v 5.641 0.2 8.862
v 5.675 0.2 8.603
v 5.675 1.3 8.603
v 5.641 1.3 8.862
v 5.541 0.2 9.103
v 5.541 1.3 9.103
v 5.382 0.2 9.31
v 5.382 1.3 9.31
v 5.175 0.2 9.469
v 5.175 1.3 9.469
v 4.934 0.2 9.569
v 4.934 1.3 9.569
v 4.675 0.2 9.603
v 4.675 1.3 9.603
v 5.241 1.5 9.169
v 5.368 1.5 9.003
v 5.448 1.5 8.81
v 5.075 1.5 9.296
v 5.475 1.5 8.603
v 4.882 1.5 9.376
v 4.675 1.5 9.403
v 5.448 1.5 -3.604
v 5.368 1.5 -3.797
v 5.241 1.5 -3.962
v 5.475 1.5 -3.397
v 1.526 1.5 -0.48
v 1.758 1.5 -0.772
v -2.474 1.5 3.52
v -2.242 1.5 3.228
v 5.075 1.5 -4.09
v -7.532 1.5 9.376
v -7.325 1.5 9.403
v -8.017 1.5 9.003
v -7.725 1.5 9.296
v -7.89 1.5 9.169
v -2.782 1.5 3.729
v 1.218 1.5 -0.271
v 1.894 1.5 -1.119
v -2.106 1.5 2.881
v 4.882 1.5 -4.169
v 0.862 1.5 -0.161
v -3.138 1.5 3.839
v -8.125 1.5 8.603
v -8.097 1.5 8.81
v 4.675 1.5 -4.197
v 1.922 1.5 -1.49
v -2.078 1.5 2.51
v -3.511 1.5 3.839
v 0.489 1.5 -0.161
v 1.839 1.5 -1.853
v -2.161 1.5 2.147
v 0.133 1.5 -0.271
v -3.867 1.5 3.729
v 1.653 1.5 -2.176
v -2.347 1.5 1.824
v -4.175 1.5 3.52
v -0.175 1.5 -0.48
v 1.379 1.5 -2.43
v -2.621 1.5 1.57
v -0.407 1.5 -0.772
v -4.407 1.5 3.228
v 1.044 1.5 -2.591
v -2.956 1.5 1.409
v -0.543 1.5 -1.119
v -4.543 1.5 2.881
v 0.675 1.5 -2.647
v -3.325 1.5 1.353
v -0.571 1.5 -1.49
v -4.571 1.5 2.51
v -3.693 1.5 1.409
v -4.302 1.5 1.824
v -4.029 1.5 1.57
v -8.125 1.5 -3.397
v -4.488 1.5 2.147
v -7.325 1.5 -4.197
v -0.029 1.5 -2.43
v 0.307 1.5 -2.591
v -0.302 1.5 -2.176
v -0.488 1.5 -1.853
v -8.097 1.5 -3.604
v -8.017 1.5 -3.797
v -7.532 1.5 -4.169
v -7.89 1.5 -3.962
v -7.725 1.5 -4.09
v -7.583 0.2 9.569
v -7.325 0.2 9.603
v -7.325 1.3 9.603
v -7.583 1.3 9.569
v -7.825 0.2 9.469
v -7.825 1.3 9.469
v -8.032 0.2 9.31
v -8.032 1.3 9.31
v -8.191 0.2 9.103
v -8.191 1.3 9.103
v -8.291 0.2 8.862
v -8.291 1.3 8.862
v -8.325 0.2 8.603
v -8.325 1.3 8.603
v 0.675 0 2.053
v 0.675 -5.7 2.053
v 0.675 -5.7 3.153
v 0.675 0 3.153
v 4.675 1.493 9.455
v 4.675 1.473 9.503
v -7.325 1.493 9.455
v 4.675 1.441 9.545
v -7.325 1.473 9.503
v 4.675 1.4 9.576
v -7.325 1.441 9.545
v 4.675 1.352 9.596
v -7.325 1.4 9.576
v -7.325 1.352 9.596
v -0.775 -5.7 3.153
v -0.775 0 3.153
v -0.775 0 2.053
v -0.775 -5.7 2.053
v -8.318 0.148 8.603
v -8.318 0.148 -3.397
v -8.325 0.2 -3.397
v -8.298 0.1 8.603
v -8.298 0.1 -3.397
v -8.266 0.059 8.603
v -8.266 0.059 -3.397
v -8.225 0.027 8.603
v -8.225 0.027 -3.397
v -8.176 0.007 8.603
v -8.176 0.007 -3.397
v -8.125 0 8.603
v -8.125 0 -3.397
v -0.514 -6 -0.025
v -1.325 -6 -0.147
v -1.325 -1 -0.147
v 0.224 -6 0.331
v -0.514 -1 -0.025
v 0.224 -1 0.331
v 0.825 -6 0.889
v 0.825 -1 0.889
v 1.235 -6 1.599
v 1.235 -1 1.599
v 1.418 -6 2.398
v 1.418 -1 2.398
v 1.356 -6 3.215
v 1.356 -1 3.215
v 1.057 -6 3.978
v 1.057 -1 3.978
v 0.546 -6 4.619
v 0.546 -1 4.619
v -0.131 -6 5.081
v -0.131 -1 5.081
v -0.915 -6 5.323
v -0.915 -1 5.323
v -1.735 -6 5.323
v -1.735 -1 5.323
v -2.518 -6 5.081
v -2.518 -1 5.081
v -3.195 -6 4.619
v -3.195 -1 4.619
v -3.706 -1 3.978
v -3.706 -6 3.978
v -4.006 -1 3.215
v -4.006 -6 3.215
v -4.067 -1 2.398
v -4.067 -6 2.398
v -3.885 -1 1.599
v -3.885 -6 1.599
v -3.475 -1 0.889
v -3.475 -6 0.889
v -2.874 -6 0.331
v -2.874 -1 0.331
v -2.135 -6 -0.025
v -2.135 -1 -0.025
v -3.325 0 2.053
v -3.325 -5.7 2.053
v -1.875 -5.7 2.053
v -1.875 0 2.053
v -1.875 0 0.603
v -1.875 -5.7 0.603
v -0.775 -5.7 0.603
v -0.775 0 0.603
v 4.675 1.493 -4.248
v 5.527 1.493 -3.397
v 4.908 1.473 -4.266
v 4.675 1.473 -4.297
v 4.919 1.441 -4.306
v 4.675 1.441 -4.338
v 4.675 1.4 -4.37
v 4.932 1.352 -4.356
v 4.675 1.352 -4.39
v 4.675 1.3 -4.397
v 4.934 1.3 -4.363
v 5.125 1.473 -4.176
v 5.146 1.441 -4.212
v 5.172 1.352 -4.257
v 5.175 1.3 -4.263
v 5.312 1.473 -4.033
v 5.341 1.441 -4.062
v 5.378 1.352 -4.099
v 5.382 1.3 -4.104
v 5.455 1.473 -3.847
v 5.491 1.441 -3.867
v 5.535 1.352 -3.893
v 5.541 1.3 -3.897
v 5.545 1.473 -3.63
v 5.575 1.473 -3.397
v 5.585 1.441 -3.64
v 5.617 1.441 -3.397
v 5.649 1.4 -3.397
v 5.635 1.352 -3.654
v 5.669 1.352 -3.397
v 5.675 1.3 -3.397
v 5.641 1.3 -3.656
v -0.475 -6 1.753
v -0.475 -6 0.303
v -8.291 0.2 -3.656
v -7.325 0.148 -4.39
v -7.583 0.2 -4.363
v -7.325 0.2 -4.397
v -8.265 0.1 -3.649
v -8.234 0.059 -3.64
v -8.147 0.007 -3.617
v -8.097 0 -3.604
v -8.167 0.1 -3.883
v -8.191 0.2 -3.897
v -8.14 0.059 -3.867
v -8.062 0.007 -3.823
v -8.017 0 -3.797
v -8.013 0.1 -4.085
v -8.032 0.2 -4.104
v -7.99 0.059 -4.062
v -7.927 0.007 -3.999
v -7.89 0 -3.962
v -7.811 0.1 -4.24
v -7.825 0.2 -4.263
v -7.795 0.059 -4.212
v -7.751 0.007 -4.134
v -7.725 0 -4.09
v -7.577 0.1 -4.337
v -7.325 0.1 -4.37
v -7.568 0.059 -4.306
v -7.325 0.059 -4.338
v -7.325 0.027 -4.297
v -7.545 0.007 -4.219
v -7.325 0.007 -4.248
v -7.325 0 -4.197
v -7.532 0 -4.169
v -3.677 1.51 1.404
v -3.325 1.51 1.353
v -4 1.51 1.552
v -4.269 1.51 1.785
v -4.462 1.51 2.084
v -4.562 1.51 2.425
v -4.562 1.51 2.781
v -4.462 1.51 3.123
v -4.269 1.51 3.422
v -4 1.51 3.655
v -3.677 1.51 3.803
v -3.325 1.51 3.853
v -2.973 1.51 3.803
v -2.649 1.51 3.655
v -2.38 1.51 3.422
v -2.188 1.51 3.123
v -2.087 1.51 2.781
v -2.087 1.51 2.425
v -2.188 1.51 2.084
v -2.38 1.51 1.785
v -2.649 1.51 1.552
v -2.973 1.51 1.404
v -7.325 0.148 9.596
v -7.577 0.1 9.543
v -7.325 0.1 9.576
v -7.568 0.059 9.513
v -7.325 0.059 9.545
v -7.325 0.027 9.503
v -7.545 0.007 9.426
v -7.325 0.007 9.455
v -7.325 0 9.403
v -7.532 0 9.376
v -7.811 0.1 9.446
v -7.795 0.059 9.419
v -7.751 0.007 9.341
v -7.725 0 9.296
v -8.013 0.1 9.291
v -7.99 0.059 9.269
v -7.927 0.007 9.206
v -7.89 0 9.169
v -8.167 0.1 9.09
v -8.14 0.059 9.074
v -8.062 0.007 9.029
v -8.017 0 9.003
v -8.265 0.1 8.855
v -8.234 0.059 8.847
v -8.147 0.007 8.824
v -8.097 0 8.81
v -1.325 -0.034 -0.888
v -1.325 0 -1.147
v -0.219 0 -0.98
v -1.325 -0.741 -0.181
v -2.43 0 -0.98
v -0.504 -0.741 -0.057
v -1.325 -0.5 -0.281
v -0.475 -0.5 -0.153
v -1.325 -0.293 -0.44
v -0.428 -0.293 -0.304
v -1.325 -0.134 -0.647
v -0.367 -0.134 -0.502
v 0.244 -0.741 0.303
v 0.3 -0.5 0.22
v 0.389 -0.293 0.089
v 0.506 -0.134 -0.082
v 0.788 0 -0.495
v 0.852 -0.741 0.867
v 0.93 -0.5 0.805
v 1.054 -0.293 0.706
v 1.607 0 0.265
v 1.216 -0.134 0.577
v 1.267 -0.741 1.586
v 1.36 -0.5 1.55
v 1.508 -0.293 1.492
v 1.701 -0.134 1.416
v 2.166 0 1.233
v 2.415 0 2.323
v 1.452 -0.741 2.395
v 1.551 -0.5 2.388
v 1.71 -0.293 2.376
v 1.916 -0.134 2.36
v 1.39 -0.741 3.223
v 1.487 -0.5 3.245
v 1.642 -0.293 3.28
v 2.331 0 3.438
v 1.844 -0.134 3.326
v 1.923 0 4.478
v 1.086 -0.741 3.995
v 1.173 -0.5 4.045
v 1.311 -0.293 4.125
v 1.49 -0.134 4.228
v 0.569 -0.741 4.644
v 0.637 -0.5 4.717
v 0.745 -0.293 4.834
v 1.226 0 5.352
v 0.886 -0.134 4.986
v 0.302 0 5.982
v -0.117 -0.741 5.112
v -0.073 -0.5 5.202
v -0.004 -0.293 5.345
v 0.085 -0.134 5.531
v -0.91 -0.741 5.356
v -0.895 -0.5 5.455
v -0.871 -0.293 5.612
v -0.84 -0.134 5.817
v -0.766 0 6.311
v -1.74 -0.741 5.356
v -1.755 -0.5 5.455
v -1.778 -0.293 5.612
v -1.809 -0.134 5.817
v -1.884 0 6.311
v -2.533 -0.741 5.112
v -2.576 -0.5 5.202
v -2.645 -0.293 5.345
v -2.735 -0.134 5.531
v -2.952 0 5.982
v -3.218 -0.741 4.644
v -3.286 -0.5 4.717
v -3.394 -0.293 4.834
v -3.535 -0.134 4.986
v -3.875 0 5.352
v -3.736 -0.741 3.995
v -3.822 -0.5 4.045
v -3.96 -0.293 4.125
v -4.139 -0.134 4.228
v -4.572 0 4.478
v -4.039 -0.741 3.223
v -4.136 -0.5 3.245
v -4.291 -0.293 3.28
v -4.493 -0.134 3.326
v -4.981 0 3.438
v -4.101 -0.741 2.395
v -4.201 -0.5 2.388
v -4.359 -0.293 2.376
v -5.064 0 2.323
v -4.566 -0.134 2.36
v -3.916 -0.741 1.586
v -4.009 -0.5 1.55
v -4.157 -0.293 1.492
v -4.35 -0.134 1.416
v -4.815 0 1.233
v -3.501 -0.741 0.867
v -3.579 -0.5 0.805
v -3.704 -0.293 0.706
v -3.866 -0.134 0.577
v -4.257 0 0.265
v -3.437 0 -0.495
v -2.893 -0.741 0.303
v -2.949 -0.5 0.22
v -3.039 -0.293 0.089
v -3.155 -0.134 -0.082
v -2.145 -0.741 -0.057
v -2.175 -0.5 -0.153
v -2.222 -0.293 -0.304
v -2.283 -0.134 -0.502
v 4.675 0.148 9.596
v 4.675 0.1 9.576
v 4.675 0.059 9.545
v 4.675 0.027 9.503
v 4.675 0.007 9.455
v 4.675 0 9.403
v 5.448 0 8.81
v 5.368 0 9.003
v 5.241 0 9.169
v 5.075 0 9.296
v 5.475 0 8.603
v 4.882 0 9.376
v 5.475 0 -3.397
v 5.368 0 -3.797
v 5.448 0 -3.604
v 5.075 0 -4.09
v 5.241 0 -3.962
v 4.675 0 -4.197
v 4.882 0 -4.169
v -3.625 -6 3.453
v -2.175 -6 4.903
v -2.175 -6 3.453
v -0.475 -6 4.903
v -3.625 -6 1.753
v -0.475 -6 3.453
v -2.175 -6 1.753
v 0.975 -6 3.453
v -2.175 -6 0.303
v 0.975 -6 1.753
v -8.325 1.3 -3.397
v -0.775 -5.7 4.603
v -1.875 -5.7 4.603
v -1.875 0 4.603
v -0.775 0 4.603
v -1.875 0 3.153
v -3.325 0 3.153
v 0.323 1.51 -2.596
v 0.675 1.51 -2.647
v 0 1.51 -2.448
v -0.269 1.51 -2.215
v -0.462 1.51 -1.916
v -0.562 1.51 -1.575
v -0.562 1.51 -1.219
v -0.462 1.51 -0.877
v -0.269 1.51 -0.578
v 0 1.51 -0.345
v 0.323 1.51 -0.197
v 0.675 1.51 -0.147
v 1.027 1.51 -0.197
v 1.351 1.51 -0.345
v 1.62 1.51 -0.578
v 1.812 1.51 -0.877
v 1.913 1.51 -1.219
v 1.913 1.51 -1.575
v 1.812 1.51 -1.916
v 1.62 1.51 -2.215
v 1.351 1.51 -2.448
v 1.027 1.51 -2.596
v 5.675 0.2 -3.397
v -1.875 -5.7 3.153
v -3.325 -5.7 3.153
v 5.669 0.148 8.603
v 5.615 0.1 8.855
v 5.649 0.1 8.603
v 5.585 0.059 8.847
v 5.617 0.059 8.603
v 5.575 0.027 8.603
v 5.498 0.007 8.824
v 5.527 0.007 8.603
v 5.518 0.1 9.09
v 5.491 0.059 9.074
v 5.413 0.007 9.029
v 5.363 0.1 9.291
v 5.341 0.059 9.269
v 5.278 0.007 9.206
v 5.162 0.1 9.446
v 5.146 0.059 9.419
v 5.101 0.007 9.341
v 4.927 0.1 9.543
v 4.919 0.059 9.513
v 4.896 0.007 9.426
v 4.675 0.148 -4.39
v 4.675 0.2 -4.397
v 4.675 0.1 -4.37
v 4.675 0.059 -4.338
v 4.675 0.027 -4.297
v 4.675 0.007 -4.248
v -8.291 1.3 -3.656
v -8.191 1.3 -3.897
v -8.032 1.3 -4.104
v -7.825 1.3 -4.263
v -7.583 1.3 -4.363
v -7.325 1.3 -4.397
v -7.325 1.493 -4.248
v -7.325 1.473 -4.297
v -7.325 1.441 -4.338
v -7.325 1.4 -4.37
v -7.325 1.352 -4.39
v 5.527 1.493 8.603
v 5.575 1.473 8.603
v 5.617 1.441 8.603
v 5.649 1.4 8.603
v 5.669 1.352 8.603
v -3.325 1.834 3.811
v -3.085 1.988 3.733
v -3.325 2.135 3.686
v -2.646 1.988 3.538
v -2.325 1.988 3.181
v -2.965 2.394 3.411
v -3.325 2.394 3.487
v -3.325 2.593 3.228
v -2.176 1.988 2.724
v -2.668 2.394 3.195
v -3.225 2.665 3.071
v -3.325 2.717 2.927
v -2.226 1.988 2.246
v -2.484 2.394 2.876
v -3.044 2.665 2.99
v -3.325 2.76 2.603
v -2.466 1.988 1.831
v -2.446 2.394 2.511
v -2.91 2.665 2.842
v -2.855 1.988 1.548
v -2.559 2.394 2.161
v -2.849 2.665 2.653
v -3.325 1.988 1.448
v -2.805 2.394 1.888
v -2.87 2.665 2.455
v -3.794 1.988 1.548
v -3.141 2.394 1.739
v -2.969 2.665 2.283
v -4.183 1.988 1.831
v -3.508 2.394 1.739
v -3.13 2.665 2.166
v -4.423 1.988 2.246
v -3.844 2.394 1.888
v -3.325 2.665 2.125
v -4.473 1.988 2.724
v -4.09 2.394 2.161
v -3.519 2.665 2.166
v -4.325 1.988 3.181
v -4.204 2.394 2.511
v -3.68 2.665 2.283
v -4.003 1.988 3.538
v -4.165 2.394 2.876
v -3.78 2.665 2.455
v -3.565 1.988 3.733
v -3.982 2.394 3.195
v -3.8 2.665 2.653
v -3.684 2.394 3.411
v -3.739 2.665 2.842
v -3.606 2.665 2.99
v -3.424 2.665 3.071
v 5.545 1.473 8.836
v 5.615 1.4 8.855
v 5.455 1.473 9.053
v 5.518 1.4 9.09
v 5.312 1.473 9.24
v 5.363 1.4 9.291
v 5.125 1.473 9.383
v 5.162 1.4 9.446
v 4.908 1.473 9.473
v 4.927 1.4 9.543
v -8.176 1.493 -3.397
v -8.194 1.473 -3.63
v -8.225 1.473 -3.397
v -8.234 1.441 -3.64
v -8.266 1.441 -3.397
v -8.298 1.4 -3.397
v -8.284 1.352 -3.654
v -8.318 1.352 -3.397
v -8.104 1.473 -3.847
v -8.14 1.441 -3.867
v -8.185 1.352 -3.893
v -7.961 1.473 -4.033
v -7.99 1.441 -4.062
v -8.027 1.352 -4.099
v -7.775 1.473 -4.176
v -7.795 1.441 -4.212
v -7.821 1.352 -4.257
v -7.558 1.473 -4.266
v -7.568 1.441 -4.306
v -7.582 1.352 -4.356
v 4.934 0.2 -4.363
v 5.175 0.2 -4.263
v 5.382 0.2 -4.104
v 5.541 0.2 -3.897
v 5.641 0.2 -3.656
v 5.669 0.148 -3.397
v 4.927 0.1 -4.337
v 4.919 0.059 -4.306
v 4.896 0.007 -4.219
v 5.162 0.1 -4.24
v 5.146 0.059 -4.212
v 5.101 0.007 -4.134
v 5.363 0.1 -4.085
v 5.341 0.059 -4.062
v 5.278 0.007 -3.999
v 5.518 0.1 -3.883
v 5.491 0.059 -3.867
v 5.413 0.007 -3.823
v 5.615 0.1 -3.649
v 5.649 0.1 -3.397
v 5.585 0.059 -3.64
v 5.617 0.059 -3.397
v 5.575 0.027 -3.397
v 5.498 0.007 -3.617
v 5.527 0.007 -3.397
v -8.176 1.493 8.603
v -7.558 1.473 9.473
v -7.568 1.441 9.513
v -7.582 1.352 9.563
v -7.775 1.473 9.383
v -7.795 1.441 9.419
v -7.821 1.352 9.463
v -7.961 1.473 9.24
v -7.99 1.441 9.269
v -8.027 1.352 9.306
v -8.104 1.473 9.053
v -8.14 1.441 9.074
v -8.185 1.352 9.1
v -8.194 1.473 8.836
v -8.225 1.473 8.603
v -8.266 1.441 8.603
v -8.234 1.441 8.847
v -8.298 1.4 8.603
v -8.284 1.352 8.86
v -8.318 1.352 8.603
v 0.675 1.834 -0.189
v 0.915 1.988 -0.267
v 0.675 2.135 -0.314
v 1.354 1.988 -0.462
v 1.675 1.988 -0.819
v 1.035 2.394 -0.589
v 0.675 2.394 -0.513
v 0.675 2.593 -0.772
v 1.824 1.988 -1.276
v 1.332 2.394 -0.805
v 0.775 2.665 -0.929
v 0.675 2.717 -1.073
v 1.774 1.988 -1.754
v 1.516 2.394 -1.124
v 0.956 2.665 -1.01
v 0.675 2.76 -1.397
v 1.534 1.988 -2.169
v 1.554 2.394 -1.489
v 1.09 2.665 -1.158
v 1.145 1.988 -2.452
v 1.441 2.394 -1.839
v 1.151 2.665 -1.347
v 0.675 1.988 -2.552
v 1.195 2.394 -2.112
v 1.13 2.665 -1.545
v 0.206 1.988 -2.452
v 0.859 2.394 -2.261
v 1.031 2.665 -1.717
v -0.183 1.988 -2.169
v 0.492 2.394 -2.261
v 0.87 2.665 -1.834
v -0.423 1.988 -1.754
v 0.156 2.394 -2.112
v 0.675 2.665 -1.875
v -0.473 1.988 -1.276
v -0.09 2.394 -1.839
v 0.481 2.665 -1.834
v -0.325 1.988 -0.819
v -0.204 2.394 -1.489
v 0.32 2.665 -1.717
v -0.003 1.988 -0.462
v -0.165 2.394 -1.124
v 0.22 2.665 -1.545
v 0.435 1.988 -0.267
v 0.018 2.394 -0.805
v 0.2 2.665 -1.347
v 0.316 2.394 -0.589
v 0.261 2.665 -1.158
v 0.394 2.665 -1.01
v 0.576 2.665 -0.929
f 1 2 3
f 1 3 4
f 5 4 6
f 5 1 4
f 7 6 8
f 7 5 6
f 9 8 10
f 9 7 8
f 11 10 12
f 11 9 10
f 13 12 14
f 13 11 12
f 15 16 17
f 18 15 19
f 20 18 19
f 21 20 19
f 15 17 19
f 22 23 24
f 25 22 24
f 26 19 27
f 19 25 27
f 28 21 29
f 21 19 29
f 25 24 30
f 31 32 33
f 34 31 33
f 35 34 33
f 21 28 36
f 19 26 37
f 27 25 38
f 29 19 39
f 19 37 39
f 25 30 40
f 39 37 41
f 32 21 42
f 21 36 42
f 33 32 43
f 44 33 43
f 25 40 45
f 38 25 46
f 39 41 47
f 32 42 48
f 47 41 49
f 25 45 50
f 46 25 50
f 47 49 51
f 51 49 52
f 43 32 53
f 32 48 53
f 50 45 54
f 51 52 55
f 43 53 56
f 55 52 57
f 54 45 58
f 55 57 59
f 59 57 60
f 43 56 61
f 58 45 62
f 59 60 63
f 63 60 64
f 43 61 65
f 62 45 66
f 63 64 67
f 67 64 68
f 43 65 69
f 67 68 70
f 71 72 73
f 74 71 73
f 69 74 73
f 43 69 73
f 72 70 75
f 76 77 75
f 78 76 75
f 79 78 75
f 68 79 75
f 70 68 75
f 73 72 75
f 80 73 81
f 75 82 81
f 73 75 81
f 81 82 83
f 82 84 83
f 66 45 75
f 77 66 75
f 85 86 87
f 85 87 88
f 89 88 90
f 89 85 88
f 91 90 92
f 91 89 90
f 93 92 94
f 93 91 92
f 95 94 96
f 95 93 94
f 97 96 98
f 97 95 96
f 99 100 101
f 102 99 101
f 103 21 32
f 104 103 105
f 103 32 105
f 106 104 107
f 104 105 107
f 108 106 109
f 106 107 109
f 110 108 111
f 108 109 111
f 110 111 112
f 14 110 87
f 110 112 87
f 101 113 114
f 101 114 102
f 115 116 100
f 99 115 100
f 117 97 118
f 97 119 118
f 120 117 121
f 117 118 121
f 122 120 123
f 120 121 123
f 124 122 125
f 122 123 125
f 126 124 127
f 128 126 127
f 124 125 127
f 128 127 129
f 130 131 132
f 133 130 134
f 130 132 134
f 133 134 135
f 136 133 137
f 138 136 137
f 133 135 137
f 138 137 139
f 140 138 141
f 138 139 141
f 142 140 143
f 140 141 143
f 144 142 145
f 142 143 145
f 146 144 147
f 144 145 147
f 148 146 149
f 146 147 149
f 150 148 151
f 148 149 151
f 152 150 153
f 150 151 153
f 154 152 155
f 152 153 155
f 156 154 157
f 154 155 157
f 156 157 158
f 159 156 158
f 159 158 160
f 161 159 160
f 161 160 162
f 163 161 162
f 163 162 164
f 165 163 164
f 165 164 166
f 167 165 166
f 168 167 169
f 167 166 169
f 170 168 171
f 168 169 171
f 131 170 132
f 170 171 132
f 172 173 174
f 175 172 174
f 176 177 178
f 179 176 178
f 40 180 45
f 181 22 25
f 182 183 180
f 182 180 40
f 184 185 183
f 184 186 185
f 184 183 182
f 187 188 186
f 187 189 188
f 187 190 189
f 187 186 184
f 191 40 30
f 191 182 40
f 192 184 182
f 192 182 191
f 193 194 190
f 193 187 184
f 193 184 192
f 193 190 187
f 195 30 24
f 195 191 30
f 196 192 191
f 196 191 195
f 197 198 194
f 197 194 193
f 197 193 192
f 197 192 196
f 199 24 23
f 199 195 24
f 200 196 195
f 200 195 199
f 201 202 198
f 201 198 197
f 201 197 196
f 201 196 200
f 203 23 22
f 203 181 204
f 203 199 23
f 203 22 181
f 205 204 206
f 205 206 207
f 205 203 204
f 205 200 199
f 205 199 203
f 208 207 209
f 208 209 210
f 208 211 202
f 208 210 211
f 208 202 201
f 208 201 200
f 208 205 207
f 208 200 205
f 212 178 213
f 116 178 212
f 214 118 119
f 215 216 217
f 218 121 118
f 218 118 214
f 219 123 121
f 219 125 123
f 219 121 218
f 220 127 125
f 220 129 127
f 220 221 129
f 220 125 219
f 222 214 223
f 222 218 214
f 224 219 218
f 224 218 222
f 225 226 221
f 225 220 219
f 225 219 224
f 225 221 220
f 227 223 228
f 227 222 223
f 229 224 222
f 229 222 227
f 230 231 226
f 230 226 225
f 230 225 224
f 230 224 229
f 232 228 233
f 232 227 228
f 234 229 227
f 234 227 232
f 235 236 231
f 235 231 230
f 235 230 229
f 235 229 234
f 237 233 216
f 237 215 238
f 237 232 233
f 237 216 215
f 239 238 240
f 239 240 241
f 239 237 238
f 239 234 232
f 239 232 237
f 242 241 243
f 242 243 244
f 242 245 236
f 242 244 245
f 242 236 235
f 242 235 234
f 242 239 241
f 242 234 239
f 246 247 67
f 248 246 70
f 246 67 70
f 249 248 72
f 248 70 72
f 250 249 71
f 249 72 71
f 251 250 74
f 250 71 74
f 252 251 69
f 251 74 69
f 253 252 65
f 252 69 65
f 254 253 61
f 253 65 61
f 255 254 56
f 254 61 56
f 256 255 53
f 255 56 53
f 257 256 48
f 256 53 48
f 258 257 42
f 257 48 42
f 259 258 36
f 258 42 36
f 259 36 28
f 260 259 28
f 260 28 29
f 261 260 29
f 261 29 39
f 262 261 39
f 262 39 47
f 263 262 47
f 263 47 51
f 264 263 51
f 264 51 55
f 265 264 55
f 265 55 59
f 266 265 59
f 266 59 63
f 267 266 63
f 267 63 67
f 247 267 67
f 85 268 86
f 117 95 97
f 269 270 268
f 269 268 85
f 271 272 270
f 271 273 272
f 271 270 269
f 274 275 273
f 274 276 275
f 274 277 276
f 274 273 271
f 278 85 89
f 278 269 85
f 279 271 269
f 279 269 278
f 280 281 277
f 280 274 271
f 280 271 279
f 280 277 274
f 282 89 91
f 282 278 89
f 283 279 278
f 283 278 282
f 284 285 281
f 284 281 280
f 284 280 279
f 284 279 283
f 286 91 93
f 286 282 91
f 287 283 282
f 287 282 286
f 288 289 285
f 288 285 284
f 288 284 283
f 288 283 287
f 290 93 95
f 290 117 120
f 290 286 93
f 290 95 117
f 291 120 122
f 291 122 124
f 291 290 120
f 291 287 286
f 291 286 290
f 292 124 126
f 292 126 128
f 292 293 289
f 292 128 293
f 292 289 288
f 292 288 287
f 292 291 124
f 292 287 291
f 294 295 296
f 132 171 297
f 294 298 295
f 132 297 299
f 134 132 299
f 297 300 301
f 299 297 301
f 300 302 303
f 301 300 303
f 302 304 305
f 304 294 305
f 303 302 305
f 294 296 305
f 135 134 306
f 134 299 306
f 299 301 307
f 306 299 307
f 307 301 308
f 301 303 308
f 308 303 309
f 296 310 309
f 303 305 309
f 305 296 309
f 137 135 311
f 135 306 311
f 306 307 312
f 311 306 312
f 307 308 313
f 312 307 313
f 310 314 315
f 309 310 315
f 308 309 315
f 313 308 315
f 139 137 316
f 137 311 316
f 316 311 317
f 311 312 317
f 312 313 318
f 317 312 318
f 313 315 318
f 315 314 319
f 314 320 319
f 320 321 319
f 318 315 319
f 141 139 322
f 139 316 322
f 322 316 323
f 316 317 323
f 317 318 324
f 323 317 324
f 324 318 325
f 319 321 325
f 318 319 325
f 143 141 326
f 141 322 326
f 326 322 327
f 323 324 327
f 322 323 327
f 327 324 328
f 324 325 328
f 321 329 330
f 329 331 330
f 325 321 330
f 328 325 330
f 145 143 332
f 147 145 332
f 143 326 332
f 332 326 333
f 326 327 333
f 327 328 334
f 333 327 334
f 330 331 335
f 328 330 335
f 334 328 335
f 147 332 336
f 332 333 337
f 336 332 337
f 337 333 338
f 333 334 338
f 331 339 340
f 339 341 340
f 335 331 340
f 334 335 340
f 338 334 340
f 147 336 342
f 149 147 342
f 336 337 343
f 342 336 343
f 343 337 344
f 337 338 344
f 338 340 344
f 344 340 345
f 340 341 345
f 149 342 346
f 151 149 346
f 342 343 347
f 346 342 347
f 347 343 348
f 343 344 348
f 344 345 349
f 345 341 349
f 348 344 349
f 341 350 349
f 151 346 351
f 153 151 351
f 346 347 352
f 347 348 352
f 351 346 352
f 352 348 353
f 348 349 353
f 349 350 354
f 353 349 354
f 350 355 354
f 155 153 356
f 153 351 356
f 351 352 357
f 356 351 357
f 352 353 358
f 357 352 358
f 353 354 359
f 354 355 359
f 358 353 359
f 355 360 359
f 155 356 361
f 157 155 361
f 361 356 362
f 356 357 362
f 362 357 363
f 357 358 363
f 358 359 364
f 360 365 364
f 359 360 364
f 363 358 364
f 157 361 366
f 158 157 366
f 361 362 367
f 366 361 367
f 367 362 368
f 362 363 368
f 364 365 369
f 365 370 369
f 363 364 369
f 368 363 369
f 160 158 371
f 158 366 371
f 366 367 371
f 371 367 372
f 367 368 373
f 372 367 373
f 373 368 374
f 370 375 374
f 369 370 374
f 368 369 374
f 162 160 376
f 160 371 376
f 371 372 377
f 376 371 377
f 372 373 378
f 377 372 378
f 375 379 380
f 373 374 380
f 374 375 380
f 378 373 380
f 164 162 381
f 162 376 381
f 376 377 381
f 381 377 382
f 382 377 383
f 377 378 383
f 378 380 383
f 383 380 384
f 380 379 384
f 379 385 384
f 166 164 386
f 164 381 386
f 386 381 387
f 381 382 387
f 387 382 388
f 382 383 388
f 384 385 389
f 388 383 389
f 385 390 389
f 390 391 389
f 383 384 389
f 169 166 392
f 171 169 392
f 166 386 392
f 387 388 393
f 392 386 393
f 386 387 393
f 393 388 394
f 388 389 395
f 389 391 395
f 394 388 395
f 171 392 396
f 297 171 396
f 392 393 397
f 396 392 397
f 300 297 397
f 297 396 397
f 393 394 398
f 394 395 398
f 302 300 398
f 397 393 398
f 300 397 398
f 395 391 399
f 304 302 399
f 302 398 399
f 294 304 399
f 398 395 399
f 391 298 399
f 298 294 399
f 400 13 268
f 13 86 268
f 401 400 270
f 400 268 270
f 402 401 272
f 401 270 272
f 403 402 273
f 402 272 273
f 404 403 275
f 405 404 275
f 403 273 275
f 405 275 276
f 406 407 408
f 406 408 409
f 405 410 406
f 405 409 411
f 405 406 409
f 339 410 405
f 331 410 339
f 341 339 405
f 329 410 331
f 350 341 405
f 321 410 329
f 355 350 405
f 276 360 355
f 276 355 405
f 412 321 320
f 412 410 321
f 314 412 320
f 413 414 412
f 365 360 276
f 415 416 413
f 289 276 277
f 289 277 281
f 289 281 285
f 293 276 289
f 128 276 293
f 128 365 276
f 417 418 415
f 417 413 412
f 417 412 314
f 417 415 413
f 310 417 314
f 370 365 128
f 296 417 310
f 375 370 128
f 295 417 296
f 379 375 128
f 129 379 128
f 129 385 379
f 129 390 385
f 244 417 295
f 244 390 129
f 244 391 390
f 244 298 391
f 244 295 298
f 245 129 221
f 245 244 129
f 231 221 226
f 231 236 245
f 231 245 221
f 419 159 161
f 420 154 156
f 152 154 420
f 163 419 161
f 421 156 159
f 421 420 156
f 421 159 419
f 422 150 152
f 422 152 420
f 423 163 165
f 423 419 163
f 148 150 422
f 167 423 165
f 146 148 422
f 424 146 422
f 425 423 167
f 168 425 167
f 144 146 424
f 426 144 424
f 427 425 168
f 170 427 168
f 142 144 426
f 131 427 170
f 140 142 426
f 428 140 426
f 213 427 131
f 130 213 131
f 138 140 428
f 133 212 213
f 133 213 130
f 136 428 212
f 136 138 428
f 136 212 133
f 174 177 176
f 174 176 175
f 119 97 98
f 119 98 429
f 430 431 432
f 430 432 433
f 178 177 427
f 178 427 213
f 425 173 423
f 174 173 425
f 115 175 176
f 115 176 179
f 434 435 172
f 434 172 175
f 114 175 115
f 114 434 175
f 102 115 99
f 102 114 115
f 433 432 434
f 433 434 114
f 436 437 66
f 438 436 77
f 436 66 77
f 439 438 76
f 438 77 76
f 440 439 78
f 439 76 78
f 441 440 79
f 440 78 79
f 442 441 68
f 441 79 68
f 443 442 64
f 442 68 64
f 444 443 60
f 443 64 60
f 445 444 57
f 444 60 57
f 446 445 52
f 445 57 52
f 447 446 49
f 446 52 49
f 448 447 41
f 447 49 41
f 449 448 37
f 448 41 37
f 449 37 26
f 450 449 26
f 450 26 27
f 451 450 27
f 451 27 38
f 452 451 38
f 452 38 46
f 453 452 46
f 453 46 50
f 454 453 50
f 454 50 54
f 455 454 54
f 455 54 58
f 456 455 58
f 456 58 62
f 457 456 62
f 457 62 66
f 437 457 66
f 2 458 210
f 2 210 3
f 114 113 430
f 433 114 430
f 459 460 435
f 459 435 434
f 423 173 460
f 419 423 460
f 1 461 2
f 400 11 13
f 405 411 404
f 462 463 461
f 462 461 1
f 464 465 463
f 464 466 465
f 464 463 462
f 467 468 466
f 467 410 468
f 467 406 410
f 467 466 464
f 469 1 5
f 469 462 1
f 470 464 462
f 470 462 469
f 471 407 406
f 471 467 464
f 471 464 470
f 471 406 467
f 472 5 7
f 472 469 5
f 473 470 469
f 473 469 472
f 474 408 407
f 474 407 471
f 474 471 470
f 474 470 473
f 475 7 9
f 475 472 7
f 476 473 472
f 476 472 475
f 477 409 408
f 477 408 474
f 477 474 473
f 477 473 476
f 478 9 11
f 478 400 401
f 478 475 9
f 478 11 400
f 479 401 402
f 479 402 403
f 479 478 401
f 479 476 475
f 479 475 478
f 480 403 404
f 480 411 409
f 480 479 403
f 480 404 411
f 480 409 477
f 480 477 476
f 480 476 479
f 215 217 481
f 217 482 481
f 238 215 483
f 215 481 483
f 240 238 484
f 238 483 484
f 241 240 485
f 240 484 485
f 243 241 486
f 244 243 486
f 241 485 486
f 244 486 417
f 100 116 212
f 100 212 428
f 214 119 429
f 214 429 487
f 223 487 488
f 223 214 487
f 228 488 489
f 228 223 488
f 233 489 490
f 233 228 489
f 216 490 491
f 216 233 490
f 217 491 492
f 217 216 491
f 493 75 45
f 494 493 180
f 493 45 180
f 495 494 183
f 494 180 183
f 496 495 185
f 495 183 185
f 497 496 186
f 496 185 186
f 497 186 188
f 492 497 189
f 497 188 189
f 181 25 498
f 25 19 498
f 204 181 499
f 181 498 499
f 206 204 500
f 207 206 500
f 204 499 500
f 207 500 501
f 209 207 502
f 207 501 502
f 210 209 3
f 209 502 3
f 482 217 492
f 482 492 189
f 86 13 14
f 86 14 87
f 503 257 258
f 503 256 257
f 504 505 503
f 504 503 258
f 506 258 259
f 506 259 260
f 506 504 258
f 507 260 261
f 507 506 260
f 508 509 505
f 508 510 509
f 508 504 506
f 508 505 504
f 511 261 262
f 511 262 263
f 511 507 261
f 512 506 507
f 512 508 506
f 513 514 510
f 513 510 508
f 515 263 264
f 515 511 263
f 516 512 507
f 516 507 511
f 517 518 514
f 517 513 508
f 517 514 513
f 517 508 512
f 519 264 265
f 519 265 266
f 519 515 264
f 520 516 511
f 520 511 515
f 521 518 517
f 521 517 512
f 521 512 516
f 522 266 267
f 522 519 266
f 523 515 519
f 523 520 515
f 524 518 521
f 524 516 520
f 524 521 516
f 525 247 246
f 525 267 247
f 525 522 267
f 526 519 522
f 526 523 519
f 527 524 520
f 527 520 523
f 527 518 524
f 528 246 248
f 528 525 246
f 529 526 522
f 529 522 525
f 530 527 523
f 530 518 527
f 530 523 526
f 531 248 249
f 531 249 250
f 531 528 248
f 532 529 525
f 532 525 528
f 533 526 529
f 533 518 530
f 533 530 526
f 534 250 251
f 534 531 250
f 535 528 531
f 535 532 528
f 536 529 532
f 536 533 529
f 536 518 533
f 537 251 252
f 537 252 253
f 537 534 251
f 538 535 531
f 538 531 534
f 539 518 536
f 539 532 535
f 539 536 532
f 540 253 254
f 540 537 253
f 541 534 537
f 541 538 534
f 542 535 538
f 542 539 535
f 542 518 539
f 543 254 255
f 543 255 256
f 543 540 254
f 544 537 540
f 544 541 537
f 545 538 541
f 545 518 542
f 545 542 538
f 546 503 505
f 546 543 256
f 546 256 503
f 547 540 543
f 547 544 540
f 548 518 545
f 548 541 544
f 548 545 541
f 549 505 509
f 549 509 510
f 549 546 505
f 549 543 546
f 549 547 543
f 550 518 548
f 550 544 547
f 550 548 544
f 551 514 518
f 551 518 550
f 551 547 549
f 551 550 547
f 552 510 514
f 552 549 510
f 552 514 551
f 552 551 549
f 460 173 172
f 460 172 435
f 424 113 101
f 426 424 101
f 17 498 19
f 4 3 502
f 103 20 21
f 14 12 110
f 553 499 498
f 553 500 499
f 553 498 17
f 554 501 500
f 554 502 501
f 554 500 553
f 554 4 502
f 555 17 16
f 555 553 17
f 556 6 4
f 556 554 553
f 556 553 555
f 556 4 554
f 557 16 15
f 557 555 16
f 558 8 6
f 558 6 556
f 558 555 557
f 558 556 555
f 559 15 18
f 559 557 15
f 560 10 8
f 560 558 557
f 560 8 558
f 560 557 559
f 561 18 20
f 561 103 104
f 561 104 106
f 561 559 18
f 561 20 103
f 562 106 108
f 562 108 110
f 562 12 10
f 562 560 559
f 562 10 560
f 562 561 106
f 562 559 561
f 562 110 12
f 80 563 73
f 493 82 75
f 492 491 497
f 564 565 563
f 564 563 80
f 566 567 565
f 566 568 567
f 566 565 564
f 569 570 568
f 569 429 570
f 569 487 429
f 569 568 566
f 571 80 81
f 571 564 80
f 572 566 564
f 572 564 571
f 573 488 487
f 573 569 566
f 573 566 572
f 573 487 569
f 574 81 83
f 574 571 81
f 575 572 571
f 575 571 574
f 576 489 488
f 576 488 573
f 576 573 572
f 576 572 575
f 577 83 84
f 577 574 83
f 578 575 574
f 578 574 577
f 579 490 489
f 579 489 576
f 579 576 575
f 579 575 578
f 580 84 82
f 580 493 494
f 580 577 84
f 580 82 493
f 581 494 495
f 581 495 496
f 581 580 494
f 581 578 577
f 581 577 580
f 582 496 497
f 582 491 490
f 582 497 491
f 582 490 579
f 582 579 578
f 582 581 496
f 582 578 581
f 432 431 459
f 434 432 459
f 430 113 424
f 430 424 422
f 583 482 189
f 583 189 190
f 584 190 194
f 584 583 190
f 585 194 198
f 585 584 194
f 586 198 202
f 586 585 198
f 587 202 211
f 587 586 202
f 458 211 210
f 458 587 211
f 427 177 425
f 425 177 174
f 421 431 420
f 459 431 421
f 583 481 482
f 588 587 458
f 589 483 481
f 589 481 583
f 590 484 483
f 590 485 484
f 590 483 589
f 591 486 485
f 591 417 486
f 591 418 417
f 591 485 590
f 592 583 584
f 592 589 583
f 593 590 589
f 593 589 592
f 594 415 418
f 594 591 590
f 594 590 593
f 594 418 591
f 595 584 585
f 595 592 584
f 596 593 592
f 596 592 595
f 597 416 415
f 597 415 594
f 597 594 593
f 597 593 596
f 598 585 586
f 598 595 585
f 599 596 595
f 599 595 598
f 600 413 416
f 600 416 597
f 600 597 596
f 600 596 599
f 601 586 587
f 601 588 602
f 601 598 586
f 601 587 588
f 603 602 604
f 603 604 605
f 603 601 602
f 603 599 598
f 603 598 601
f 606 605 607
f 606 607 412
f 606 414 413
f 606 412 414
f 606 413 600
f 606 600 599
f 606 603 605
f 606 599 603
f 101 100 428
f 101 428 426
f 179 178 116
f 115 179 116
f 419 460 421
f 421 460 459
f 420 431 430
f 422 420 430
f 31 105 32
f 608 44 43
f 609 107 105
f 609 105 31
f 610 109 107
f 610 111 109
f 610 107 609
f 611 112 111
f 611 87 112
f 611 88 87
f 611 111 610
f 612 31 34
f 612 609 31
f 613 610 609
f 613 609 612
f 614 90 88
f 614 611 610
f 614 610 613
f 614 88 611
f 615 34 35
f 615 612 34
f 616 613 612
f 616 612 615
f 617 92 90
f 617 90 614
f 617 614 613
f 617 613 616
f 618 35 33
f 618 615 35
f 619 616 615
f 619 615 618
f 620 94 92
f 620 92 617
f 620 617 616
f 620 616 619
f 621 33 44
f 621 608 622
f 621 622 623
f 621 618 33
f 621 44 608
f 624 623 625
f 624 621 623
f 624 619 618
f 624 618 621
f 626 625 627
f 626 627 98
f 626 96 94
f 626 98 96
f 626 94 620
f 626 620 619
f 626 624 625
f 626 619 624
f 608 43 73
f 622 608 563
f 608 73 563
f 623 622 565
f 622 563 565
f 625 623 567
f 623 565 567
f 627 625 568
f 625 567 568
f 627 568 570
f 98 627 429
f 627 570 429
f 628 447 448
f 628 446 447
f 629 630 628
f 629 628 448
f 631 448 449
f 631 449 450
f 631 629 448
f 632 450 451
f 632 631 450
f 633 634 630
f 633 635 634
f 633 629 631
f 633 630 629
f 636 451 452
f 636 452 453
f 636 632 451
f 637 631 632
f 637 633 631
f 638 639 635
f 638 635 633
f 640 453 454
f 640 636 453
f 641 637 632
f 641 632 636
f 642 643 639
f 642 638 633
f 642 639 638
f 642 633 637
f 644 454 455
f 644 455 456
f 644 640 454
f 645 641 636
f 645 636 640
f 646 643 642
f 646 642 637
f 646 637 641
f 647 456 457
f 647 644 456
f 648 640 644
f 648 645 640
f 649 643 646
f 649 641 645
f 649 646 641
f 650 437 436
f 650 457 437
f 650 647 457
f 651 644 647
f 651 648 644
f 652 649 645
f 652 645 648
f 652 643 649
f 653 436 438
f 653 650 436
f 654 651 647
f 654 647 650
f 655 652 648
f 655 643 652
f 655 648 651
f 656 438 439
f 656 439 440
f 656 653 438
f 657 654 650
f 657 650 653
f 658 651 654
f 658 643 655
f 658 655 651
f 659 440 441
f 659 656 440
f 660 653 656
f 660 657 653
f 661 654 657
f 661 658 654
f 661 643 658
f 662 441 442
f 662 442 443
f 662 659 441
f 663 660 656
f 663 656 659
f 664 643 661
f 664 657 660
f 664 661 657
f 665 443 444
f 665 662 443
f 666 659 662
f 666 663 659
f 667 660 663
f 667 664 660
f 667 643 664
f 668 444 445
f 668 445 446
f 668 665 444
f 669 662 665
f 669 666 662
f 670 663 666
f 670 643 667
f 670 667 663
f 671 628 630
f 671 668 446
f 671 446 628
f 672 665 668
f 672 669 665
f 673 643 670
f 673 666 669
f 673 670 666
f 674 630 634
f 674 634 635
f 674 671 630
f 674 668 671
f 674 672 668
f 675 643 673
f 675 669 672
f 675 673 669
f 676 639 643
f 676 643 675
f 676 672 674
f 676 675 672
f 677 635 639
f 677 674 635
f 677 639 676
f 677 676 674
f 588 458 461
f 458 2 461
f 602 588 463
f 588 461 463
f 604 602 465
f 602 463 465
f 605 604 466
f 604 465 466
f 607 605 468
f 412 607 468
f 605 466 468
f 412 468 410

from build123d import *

# Parameters (mm, degrees)
BOSS_EXTRUDE1_DEPTH = 1.5
SKETCH2_R           = 2.75
BOSS_EXTRUDE2_DEPTH = 6
SKETCH3_W           = 1.1
SKETCH3_H           = 1.45
SKETCH3_W_2         = 1.45
SKETCH3_H_2         = 1.1
CUT_EXTRUDE1_DEPTH  = 6
CHAMFER1_SIZE       = 0.3
FILLET1_R           = 1
SKETCH4_R           = 1.25
BOSS_EXTRUDE3_DEPTH = 0.01
DOME2_FACE_RADIUS   = 1.25
DOME2_HEIGHT        = 1.25
DOME3_FACE_RADIUS   = 1.25
DOME3_HEIGHT        = 1.25
FILLET3_R           = 0.2


with BuildPart() as part:
    # Sketch1 → Boss-Extrude1 (new body)
    with BuildSketch(Plane(origin=(0, 0, 0), x_dir=(1, 0, 0), z_dir=(0, 1, 0))):
        with BuildLine():
            Line((-7.324675649, 4.396717546), (4.675324351, 4.396717546))
            ThreePointArc((4.675324351, 4.396717546), (5.382431132, 4.103824327), (5.675324351, 3.396717546))
            Line((5.675324351, 3.396717546), (5.675324351, -8.603282454))
            ThreePointArc((5.675324351, -8.603282454), (5.382431132, -9.310389235), (4.675324351, -9.603282454))
            Line((4.675324351, -9.603282454), (-7.324675649, -9.603282454))
            ThreePointArc((-7.324675649, -9.603282454), (-8.03178243, -9.310389235), (-8.324675649, -8.603282454))
            Line((-8.324675649, -8.603282454), (-8.324675649, 3.396717546))
            ThreePointArc((-8.324675649, 3.396717546), (-8.03178243, 4.103824327), (-7.324675649, 4.396717546))
        make_face()
    extrude(amount=BOSS_EXTRUDE1_DEPTH)

    # Sketch2 → Boss-Extrude2 (add)
    with BuildSketch(Plane.XZ):
        with Locations(Location((-1.324675649, 2.603282454, 0), (0, 0, 270))):
            Circle(SKETCH2_R)
    extrude(amount=BOSS_EXTRUDE2_DEPTH)

    # Sketch3 → Cut-Extrude1 (cut)
    with BuildSketch(Plane.XZ.offset(6)):
        with Locations((-1.324675649, 3.878282454)):
            Rectangle(SKETCH3_W, SKETCH3_H)
        with Locations((-0.049675649, 2.603282454)):
            Rectangle(SKETCH3_W_2, SKETCH3_H_2)
        with Locations((-1.324675649, 2.603282454)):
            Rectangle(SKETCH3_W, SKETCH3_H_2)
        with Locations((-2.599675649, 2.603282454)):
            Rectangle(SKETCH3_W_2, SKETCH3_H_2)
        with Locations((-1.324675649, 1.328282454)):
            Rectangle(SKETCH3_W, SKETCH3_H)
    extrude(amount=-CUT_EXTRUDE1_DEPTH, mode=Mode.SUBTRACT)

    # Chamfer1
    chamfer1_edges = [part.edges().sort_by_distance(p)[0] for p in [
        (-0.774675649, -6, 3.878282454),
        (-0.049675649, -6, 3.153282454),
        (0.675324351, -6, 2.603282454),
        (-0.774675649, -6, 1.328282454),
        (-2.599675649, -6, 3.153282454),
        (-1.324675649, -6, 4.603282454),
        (-1.874675649, -6, 3.878282454),
        (-3.324675649, -6, 2.603282454),
        (-2.599675649, -6, 2.053282454),
        (-1.874675649, -6, 1.328282454),
        (-1.324675649, -6, 0.603282454),
        (-0.049675649, -6, 2.053282454),
    ]]
    chamfer(chamfer1_edges, length=CHAMFER1_SIZE)

    # Fillet1
    fillet1_edges = [part.edges().sort_by_distance(p)[0] for p in [
        (-1.324675649, 0, 5.353282454),
    ]]
    fillet(fillet1_edges, radius=FILLET1_R)

    # Sketch4 → Boss-Extrude3 (add)
    with BuildSketch(Plane(origin=(0, 1.5, 0), x_dir=(1, 0, 0), z_dir=(0, 1, 0))):
        with Locations(Location((-3.324675649, -2.603282454, 0), (0, 0, 90))):
            Circle(SKETCH4_R)
        with Locations(Location((0.675324351, 1.396717546, 0), (0, 0, 90))):
            Circle(SKETCH4_R)
    extrude(amount=BOSS_EXTRUDE3_DEPTH)

    # Dome2: a dome of height H over a round flat face of radius A is a cap of a sphere of radius (A * A + H * H) / (2 * H)
    dome2_r = (DOME2_FACE_RADIUS * DOME2_FACE_RADIUS + DOME2_HEIGHT * DOME2_HEIGHT) / (2 * DOME2_HEIGHT)
    dome2_base = Plane((0.675324351, 1.51, -1.396717546), z_dir=(0, 1, 0))
    with Locations(dome2_base.offset(DOME2_HEIGHT - dome2_r)):
        dome2_ball = Sphere(dome2_r, mode=Mode.PRIVATE)
    add(split(dome2_ball, bisect_by=dome2_base, keep=Keep.TOP, mode=Mode.PRIVATE))

    # Dome3: a dome of height H over a round flat face of radius A is a cap of a sphere of radius (A * A + H * H) / (2 * H)
    dome3_r = (DOME3_FACE_RADIUS * DOME3_FACE_RADIUS + DOME3_HEIGHT * DOME3_HEIGHT) / (2 * DOME3_HEIGHT)
    dome3_base = Plane((-3.324675649, 1.51, 2.603282454), z_dir=(0, 1, 0))
    with Locations(dome3_base.offset(DOME3_HEIGHT - dome3_r)):
        dome3_ball = Sphere(dome3_r, mode=Mode.PRIVATE)
    add(split(dome3_ball, bisect_by=dome3_base, keep=Keep.TOP, mode=Mode.PRIVATE))

    # Fillet3
    fillet3_edges = [part.edges().sort_by_distance(p)[0] for p in [
        (5.382431132, 1.5, 9.310389235),
        (-1.324675649, 0, 9.603282454),
        (-8.03178243, 0, 9.310389235),
        (5.675324351, 1.5, 2.603282454),
        (5.382431132, 1.5, -4.103824327),
        (-1.324675649, 1.5, -4.396717546),
        (-8.03178243, 1.5, -4.103824327),
        (-8.324675649, 1.5, 2.603282454),
        (-8.03178243, 1.5, 9.310389235),
        (-1.324675649, 1.5, 9.603282454),
        (-8.324675649, 0, 2.603282454),
        (-8.03178243, 0, -4.103824327),
        (-1.324675649, 0, -4.396717546),
        (5.382431132, 0, -4.103824327),
        (5.675324351, 0, 2.603282454),
        (5.382431132, 0, 9.310389235),
    ]]
    fillet(fillet3_edges, radius=FILLET3_R)


solid = part.part
